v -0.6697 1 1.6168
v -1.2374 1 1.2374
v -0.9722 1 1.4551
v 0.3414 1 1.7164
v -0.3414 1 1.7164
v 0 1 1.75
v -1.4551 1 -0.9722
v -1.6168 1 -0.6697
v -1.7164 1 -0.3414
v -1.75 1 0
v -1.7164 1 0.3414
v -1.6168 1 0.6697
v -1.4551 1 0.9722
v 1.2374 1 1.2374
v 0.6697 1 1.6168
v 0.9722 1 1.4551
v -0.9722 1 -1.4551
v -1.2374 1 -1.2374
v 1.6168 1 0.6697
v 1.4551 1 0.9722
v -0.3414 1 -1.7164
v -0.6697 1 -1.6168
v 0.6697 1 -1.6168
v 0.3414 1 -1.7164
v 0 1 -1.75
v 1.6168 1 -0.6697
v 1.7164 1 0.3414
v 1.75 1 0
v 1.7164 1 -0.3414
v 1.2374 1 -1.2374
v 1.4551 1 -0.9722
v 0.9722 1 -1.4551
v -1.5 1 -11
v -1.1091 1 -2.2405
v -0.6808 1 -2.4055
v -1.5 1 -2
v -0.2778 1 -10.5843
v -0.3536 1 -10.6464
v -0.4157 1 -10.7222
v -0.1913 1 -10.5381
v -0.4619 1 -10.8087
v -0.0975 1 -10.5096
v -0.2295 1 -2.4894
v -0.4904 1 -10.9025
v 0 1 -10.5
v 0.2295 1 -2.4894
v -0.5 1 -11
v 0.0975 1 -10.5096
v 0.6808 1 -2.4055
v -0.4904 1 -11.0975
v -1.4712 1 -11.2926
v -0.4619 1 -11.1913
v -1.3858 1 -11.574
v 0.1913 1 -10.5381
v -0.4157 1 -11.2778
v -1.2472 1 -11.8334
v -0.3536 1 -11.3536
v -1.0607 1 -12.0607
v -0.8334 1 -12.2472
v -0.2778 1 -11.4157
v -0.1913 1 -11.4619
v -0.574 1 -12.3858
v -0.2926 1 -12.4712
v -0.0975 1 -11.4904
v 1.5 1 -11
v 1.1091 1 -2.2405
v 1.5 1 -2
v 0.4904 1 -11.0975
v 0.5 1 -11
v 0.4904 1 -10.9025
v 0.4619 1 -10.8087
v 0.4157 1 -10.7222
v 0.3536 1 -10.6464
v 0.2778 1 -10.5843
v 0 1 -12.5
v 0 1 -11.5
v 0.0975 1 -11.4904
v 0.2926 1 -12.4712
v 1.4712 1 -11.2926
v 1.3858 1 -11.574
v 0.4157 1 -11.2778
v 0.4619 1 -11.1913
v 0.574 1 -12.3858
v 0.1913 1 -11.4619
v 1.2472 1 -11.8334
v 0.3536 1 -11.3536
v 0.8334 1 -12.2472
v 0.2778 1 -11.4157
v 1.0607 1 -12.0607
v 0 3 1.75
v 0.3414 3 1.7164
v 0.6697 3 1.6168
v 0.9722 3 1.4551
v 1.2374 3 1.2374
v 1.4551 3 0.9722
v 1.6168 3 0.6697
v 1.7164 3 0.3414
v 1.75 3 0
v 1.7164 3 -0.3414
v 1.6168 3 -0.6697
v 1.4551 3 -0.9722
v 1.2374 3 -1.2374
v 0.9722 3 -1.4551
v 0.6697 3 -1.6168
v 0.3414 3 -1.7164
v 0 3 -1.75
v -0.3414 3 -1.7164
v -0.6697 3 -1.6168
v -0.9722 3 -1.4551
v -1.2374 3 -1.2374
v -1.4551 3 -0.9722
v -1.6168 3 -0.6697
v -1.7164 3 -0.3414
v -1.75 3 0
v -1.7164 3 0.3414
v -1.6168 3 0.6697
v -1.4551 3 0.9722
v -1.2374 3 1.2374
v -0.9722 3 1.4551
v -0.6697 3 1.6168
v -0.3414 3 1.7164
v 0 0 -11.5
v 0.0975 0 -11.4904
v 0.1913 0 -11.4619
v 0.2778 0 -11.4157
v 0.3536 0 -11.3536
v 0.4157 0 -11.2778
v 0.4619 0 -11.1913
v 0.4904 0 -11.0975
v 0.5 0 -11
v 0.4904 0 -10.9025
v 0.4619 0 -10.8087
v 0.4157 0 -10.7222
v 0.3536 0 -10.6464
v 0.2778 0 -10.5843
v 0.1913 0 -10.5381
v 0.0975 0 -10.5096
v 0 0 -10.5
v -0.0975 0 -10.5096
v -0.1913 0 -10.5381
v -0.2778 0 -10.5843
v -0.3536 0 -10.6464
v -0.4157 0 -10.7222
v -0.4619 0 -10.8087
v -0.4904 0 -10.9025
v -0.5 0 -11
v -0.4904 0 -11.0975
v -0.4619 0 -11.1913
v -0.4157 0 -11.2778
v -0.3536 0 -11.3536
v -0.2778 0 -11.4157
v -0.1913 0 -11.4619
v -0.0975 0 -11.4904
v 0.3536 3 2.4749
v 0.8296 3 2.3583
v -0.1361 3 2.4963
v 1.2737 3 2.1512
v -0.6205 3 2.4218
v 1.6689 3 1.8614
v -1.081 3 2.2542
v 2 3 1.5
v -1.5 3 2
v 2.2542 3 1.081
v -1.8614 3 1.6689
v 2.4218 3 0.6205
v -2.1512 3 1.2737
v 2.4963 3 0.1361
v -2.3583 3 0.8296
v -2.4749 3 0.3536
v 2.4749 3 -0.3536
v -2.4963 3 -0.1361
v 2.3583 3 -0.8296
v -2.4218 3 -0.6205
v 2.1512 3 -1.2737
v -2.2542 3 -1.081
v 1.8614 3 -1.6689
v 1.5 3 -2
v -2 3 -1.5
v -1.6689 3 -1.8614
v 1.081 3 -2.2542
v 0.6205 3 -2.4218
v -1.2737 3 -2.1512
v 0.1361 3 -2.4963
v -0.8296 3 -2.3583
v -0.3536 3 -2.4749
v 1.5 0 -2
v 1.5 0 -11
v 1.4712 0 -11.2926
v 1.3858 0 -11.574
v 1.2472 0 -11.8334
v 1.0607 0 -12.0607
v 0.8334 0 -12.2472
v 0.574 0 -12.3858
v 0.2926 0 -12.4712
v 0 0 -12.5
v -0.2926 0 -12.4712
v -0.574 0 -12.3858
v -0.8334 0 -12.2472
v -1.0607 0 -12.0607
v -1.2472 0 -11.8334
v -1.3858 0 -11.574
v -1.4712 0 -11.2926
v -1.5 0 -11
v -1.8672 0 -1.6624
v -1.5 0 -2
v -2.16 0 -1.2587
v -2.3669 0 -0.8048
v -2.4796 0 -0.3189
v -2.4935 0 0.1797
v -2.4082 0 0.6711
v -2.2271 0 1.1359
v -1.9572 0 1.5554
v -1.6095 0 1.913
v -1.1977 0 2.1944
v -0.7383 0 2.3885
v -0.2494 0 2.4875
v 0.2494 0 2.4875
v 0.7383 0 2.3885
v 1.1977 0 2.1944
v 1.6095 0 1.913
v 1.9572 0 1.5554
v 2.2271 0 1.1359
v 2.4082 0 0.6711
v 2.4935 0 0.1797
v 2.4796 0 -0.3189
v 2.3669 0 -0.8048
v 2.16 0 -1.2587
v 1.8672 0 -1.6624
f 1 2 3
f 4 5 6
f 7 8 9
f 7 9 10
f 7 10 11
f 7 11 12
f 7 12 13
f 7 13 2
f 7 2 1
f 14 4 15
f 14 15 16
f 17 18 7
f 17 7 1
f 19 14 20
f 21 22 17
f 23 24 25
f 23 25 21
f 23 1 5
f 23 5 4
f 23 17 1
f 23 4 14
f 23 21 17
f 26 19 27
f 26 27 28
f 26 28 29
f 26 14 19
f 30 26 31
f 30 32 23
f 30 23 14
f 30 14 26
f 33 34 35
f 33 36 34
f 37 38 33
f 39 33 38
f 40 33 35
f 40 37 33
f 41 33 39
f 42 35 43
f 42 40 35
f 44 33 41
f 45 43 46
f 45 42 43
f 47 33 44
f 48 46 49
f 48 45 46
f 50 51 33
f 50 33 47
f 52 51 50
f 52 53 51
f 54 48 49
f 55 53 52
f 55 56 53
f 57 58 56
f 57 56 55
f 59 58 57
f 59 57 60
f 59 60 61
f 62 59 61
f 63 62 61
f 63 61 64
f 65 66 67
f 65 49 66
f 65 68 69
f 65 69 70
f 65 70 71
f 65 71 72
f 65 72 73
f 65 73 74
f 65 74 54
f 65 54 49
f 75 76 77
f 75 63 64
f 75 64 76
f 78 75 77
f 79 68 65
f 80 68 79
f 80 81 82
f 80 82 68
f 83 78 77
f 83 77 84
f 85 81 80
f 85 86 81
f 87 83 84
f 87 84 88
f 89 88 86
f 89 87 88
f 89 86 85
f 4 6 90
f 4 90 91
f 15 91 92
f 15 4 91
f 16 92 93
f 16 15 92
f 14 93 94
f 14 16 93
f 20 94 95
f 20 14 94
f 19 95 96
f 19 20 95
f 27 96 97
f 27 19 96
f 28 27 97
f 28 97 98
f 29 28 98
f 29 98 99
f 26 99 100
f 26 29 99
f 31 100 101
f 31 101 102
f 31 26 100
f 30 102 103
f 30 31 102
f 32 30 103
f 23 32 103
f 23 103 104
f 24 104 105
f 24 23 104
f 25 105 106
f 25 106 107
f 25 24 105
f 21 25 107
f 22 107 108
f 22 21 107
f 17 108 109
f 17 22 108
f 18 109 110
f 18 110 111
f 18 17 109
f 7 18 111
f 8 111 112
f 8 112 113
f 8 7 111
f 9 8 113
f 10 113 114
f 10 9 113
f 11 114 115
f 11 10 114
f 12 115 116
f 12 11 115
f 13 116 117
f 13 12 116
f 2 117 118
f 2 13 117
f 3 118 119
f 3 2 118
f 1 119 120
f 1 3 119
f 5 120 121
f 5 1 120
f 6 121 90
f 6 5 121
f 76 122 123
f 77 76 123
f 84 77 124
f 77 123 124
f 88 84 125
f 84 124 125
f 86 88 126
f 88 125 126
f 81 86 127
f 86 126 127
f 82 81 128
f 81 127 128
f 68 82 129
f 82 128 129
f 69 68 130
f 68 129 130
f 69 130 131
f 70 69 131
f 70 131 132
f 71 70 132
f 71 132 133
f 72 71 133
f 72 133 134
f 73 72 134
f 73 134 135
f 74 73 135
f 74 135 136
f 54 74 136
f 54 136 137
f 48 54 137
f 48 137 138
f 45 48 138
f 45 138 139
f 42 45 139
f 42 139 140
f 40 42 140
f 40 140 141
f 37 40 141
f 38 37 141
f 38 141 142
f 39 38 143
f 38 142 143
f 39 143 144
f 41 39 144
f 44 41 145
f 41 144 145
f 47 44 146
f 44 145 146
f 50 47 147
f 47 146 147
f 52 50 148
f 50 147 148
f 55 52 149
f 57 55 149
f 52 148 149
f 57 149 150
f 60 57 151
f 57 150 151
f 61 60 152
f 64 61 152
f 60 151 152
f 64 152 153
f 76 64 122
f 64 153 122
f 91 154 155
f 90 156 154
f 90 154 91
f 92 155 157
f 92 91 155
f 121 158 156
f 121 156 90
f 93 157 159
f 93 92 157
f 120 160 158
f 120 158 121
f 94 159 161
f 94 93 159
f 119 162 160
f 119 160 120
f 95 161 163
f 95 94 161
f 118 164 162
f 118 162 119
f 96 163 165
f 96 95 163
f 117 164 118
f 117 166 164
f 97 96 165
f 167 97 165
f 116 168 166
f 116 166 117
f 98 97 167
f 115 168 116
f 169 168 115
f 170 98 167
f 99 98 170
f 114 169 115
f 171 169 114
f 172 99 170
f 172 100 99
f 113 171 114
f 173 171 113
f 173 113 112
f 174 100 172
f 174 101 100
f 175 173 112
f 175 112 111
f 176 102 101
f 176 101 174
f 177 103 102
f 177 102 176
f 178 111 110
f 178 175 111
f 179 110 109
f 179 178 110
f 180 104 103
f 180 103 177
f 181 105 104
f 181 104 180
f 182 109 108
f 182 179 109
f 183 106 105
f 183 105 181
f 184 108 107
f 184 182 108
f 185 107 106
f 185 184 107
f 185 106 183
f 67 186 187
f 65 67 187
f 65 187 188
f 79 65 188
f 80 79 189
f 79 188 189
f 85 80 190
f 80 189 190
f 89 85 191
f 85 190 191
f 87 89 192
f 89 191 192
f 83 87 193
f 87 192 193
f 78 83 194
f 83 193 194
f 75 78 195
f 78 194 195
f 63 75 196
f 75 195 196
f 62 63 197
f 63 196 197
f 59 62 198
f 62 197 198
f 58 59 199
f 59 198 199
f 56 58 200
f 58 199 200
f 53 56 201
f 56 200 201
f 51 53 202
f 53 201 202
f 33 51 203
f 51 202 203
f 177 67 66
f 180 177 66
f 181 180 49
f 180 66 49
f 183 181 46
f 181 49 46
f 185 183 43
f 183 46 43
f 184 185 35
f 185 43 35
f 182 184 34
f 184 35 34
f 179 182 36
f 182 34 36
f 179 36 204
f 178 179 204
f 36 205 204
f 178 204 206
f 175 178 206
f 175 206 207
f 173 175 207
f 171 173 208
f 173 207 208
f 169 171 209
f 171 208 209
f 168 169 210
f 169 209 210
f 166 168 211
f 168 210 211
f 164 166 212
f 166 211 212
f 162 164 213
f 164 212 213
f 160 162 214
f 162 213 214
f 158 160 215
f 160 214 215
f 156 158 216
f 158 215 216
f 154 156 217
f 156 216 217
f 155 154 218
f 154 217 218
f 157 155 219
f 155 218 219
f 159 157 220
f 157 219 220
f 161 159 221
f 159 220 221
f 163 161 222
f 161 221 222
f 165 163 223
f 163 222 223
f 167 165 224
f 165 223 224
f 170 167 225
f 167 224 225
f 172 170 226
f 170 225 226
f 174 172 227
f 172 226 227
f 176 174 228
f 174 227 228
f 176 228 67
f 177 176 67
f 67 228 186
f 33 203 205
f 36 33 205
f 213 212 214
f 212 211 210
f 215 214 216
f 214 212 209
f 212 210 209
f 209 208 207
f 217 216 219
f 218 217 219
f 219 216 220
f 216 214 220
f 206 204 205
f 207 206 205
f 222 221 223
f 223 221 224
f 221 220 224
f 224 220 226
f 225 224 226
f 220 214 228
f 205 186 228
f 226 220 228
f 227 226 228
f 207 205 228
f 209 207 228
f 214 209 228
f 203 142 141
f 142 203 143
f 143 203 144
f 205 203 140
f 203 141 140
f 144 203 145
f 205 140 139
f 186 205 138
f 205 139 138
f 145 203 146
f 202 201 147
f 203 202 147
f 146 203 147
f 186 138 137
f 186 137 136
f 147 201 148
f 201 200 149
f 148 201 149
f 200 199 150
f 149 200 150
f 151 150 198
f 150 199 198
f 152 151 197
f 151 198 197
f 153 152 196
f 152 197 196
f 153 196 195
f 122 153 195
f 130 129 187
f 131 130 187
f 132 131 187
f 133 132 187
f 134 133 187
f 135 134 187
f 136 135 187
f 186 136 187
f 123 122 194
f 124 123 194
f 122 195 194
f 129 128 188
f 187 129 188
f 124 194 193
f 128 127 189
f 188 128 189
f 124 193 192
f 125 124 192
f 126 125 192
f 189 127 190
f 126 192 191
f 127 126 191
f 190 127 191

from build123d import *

# Parameters (mm, degrees)
SKETCH3_R           = 2.5
BOSS_EXTRUDE2_DEPTH = 1
SKETCH4_R           = 2.5
SKETCH4_R_2         = 1.75
BOSS_EXTRUDE3_DEPTH = 2
SKETCH5_R           = 0.5
CUT_EXTRUDE1_DEPTH  = 2


with BuildPart() as part:
    # Sketch3 → Boss-Extrude2 (new body)
    with BuildSketch(Plane(origin=(0, 0, 0), x_dir=(1, 0, 0), z_dir=(0, 1, 0))):
        with BuildLine():
            Line((-1.5, 11), (-1.5, 2))
            ThreePointArc((-1.5, 2), (0, 2.5), (1.5, 2))
            Line((1.5, 2), (1.5, 11))
            ThreePointArc((1.5, 11), (0, 12.5), (-1.5, 11))
        make_face()
        Circle(SKETCH3_R)
    extrude(amount=BOSS_EXTRUDE2_DEPTH)

    # Sketch4 → Boss-Extrude3 (add)
    with BuildSketch(Plane(origin=(0, 1, 0), x_dir=(1, 0, 0), z_dir=(0, 1, 0))):
        with Locations(Location((0, 0, 0), (0, 0, 53.130102354))):
            Circle(SKETCH4_R)
        with Locations(Location((0, 0, 0), (0, 0, 270))):
            Circle(SKETCH4_R_2, mode=Mode.SUBTRACT)
    extrude(amount=BOSS_EXTRUDE3_DEPTH)

    # Sketch5 → Cut-Extrude1 (cut)
    with BuildSketch(Plane.XZ):
        with Locations(Location((0, -11, 0), (0, 0, 270))):
            Circle(SKETCH5_R)
    extrude(amount=-CUT_EXTRUDE1_DEPTH, mode=Mode.SUBTRACT)


solid = part.part
